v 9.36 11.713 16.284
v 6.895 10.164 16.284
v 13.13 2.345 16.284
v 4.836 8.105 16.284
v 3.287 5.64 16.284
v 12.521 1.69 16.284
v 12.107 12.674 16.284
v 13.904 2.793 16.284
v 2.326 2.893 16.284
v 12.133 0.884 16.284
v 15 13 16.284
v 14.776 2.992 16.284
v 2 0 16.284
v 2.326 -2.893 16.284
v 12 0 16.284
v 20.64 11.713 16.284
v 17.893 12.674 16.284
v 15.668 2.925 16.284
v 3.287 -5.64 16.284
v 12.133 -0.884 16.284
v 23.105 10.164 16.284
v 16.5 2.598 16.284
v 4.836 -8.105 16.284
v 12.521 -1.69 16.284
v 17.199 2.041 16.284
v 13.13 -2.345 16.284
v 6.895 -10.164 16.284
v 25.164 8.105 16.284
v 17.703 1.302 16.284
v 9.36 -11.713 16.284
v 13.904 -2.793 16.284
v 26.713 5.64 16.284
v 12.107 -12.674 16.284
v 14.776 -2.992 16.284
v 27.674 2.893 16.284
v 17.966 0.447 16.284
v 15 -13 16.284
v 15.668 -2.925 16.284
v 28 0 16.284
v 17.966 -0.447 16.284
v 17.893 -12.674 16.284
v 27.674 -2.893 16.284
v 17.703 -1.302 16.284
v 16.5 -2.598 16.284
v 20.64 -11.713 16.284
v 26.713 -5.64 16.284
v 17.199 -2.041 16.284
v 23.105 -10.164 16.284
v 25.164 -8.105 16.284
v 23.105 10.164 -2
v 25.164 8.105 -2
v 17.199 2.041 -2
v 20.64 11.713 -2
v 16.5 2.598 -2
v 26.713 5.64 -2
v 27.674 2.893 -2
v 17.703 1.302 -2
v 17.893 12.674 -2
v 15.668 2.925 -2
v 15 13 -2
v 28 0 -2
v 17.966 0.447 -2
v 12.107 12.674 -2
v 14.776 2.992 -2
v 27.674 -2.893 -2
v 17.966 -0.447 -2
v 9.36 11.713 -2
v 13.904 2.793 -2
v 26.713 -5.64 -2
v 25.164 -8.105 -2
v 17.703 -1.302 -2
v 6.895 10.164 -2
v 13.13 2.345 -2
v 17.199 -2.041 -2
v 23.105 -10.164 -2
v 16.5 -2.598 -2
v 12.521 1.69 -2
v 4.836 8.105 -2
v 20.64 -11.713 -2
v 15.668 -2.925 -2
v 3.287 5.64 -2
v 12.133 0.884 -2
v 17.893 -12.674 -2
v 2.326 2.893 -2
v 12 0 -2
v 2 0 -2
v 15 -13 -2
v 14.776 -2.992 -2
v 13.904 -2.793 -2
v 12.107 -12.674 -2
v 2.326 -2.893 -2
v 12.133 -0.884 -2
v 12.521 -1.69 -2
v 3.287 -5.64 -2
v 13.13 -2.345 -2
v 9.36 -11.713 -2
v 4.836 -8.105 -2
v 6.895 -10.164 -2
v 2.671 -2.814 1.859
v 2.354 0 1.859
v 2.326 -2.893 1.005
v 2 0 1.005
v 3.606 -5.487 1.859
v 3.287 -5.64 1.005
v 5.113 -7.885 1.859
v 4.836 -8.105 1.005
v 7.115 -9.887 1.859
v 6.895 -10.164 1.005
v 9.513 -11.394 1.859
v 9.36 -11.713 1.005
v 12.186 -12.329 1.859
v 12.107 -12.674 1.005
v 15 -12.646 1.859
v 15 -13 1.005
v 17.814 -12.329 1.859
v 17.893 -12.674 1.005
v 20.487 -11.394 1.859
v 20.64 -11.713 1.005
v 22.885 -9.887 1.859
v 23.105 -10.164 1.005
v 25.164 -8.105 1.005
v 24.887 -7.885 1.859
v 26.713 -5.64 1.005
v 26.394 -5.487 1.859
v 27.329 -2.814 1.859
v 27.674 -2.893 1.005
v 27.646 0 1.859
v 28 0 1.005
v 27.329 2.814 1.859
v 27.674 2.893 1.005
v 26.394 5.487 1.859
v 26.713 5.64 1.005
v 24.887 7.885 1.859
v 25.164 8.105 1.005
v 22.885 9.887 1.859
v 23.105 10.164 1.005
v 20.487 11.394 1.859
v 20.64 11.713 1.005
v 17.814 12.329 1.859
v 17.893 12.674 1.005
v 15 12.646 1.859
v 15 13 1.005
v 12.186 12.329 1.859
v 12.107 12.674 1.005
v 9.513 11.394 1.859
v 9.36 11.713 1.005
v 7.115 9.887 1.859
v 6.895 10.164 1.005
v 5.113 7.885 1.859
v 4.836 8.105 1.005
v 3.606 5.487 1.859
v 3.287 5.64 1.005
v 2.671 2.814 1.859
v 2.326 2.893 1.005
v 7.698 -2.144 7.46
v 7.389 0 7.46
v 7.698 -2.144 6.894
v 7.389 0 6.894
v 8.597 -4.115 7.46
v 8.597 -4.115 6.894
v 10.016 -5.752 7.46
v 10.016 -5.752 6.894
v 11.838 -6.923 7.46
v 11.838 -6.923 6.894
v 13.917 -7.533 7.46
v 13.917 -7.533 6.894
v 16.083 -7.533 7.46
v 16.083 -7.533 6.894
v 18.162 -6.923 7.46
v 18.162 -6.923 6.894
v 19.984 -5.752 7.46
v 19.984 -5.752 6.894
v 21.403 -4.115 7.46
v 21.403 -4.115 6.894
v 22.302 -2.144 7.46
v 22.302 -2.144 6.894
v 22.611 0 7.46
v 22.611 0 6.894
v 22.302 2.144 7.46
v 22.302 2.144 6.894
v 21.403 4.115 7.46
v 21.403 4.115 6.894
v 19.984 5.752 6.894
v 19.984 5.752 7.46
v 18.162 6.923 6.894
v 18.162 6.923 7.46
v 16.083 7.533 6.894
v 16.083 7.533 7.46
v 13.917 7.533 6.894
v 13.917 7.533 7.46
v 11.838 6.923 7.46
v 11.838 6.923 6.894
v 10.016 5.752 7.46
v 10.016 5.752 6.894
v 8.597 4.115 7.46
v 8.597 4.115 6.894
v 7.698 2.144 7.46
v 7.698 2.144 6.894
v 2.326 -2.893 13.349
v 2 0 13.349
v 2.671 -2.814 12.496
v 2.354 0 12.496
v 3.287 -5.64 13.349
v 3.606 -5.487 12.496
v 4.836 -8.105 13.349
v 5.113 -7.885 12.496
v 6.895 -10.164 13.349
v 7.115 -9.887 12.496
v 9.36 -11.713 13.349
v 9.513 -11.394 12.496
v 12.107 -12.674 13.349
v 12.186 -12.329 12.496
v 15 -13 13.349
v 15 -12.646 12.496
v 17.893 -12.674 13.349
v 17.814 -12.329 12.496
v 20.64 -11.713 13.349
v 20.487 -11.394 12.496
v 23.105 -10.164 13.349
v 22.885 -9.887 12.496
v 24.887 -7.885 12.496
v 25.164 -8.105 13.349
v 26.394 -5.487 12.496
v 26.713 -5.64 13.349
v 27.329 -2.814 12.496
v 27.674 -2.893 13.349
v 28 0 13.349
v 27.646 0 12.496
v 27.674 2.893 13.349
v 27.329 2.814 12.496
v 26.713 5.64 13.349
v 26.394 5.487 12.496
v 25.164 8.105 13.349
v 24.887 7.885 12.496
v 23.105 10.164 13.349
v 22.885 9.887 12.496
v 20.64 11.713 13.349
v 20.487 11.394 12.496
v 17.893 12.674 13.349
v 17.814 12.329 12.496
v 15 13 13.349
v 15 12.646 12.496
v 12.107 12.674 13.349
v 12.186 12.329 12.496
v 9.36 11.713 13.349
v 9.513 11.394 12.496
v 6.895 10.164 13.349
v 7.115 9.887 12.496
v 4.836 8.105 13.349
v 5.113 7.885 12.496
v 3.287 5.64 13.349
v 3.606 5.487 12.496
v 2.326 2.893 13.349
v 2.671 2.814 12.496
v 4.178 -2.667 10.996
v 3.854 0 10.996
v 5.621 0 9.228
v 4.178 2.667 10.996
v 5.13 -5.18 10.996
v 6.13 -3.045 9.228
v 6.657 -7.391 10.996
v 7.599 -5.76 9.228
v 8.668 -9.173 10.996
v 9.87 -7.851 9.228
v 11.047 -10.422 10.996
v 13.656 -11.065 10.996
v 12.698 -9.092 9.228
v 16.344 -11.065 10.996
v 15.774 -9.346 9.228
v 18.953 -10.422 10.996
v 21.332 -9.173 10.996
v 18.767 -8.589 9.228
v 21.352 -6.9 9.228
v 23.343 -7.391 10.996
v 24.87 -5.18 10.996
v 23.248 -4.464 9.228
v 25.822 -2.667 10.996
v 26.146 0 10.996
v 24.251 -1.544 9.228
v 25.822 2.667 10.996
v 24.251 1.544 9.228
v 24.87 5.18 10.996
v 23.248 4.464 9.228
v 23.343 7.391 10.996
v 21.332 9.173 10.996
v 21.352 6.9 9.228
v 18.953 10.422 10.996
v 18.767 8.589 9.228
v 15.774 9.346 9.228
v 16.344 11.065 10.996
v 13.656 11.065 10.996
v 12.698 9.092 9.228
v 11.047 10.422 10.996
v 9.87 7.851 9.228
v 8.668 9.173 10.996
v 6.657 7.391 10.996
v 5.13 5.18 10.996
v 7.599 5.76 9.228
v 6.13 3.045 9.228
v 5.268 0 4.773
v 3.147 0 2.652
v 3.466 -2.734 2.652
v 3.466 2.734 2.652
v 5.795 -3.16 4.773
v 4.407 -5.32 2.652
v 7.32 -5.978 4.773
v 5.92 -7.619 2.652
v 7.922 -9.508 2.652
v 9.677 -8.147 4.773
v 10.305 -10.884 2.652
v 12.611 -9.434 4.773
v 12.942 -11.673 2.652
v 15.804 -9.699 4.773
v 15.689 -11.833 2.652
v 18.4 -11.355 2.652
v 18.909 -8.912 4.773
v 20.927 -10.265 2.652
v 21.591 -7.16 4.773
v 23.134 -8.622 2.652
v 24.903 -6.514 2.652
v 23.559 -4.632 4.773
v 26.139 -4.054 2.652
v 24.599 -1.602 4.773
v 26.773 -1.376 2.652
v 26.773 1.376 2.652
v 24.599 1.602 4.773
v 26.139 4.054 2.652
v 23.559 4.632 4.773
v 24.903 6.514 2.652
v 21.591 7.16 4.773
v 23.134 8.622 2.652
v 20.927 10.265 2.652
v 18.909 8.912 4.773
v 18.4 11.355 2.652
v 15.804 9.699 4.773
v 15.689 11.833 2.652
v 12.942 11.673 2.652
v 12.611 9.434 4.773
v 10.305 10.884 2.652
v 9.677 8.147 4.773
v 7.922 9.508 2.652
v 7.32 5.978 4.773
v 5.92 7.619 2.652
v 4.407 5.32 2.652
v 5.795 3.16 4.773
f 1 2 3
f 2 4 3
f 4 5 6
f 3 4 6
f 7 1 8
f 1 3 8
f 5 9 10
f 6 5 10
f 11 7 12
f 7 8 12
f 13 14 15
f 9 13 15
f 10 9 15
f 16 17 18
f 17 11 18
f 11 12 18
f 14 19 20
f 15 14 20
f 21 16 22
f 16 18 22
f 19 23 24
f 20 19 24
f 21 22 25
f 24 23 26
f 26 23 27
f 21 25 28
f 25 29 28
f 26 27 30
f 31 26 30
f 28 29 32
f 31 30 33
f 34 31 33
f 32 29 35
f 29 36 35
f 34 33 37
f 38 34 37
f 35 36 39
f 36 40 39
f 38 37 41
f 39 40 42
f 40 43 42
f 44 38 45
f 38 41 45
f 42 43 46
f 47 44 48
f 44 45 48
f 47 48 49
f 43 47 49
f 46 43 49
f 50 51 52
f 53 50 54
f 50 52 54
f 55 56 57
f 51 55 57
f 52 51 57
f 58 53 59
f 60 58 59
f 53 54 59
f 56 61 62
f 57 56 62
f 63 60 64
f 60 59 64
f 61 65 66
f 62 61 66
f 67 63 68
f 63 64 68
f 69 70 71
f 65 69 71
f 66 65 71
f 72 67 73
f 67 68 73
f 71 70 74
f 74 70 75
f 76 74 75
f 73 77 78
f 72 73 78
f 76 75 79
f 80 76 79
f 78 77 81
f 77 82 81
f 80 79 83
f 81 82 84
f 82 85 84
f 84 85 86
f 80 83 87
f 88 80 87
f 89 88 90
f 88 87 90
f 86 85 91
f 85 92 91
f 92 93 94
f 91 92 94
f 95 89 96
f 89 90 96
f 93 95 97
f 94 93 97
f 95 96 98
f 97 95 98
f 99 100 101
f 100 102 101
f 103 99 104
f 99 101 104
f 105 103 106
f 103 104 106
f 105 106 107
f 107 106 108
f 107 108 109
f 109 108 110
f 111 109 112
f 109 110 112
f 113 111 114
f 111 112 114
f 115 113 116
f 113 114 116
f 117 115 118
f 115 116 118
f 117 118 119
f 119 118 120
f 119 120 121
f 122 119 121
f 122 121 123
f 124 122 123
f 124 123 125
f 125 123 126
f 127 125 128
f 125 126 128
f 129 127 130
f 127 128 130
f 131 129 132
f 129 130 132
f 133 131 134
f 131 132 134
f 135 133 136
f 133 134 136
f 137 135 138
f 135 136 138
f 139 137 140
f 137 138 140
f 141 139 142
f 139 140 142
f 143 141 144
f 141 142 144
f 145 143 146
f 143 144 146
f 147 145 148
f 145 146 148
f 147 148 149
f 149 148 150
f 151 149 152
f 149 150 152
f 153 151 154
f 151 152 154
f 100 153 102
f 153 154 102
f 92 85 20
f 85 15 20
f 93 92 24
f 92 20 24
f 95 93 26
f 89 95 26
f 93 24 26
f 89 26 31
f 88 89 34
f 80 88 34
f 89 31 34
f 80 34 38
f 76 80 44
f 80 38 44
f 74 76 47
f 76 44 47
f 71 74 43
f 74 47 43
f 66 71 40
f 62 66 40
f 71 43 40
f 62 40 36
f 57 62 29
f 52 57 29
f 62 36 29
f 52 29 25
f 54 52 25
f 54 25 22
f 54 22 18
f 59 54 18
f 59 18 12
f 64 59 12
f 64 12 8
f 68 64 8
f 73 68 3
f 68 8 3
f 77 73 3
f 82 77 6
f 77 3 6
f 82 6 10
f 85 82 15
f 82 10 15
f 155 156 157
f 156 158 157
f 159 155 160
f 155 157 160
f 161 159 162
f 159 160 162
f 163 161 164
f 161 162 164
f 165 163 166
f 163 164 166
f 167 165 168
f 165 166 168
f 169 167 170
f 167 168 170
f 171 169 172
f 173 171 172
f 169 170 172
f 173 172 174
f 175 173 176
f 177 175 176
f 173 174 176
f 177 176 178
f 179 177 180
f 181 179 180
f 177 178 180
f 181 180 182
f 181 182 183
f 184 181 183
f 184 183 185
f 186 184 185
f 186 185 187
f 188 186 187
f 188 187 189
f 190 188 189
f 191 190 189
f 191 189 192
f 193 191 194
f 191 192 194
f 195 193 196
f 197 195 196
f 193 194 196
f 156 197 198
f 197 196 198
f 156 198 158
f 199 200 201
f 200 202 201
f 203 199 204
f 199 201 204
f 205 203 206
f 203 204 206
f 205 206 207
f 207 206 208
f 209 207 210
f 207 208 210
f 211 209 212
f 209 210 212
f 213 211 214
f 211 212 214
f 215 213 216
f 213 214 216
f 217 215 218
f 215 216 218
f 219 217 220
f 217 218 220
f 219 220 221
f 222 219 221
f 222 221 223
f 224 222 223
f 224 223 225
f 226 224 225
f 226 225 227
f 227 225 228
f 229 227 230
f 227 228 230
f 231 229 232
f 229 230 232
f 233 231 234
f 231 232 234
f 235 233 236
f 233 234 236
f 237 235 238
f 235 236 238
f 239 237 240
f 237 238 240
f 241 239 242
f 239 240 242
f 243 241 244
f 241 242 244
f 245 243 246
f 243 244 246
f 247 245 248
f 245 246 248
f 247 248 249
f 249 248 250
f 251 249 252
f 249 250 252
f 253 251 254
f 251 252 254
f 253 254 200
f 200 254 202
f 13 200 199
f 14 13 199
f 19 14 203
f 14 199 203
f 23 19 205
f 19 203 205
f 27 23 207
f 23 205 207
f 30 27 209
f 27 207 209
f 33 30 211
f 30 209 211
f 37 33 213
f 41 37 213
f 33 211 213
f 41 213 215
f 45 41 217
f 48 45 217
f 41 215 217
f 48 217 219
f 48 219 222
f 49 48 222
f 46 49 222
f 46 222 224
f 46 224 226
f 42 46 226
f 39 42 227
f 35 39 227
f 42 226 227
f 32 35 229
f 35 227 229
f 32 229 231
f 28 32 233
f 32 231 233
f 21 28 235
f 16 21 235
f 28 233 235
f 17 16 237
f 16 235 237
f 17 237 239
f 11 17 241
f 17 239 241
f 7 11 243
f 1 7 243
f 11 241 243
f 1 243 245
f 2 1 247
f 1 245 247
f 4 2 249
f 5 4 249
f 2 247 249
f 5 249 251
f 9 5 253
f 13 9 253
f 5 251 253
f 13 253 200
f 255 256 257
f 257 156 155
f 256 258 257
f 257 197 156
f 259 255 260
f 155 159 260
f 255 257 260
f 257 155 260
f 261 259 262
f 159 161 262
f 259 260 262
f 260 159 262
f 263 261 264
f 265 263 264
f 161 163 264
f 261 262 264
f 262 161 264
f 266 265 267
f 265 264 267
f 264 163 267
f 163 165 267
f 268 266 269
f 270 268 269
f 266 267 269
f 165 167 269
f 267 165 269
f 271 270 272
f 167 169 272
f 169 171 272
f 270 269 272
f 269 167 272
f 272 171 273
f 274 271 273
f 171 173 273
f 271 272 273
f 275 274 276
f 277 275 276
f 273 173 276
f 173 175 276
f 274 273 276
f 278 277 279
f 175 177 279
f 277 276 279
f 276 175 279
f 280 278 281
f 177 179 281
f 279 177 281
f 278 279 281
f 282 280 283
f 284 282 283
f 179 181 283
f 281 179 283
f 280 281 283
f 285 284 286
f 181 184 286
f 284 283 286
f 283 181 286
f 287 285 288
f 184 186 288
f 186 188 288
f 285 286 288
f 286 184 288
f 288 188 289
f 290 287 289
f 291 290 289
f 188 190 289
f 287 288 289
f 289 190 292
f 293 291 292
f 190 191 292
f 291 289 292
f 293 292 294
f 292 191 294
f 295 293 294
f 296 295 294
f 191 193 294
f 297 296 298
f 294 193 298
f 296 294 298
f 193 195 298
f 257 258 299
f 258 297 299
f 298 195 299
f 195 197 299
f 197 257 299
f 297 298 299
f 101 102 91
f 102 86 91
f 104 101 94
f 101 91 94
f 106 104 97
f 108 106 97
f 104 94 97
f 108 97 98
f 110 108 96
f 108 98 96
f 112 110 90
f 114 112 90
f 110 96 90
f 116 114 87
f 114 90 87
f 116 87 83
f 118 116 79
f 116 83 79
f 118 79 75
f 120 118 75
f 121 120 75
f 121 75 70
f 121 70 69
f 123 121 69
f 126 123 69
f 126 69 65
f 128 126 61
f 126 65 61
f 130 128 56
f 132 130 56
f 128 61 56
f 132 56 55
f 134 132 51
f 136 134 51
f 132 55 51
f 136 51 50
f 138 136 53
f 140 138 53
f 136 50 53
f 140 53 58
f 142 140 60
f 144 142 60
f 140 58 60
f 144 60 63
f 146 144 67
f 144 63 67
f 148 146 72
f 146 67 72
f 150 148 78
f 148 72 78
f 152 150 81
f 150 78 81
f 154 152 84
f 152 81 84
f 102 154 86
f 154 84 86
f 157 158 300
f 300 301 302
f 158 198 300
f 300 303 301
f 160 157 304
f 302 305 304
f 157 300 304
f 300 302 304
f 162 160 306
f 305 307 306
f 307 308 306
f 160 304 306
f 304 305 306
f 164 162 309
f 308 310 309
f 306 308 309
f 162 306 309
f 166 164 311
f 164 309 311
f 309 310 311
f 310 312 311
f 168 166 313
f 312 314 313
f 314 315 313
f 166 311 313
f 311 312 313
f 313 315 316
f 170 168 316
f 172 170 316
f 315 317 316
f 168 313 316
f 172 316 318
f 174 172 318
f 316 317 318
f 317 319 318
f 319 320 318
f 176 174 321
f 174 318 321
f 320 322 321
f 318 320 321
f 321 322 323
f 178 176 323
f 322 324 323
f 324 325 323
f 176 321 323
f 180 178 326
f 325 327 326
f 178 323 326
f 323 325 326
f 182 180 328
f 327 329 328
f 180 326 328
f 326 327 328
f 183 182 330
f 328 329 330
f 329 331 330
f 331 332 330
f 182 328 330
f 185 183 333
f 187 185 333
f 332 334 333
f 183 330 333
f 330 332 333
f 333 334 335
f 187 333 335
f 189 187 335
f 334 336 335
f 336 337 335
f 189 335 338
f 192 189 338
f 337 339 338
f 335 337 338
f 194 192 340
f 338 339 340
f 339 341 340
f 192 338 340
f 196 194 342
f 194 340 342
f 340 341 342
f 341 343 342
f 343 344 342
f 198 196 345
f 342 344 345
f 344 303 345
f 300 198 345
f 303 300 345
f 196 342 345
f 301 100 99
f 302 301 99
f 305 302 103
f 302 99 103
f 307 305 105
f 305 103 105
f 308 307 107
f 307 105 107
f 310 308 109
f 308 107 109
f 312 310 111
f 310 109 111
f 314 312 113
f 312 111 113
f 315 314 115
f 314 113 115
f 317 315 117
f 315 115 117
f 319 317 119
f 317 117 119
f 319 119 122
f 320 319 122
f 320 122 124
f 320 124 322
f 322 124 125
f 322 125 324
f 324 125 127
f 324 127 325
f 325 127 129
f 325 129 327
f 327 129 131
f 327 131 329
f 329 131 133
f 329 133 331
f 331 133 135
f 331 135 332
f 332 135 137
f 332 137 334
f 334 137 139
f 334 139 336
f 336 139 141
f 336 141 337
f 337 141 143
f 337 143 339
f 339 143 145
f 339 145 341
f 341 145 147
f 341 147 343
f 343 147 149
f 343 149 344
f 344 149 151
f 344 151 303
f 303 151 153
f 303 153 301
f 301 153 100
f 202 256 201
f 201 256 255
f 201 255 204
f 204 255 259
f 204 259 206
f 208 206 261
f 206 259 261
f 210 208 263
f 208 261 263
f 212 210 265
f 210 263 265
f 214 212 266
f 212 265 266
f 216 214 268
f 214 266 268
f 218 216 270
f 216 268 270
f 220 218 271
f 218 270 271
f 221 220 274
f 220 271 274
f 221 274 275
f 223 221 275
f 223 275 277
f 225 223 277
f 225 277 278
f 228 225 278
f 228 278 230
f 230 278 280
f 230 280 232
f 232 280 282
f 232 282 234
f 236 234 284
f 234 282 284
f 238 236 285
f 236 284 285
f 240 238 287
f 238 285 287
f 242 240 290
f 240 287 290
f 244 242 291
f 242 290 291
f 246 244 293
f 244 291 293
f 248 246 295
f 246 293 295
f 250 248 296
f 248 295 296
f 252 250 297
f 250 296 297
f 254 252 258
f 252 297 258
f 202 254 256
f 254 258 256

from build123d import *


# Not quite as in the source:
# - a fillet or chamfer that OpenCascade refuses, or shapes differently, is made with other operations: its cross-section is extruded or revolved along the edge and cut away or added


with BuildPart() as f1:
    # F0 (on Front) → F1 (revolve)
    with BuildSketch(Plane.XZ):
        Polygon((2, 1.5050252532), (2, 0), (2, -2), (12, -2), (12, 16.28355698), (2, 16.28355698), (2, 14.28355698), (2, 12.8492424049), (3.8537319575, 10.9955104475), (7.3892658634, 7.4599765415), (7.3892658634, 6.8942911166), (3.1466251763, 2.6516504294), align=None)
    revolve(axis=Axis((15, 0, 2.570889245), (0, 0, 1)))

    # F2: chamfer of 0.5 on 2 edges, made by hand

    # F2_s1 → F2_t2 (revolve, cut)
    with BuildSketch(Plane.XZ):
        Polygon((2, 13.3492424049), (2.3535533906, 12.4956890143), (2, 12.8492424049), align=None)
    revolve(axis=Axis((15, 0, 12.8492424049), (0, 0, 1)), mode=Mode.SUBTRACT)

    # F2_s3 → F2_t4 (revolve, cut)
    with BuildSketch(Plane.XZ):
        Polygon((2.3535533906, 1.8585786438), (2, 1.0050252532), (2, 1.5050252532), align=None)
    revolve(axis=Axis((15, 0, 1.5050252532), (0, 0, 1)), mode=Mode.SUBTRACT)


solid = f1.part
